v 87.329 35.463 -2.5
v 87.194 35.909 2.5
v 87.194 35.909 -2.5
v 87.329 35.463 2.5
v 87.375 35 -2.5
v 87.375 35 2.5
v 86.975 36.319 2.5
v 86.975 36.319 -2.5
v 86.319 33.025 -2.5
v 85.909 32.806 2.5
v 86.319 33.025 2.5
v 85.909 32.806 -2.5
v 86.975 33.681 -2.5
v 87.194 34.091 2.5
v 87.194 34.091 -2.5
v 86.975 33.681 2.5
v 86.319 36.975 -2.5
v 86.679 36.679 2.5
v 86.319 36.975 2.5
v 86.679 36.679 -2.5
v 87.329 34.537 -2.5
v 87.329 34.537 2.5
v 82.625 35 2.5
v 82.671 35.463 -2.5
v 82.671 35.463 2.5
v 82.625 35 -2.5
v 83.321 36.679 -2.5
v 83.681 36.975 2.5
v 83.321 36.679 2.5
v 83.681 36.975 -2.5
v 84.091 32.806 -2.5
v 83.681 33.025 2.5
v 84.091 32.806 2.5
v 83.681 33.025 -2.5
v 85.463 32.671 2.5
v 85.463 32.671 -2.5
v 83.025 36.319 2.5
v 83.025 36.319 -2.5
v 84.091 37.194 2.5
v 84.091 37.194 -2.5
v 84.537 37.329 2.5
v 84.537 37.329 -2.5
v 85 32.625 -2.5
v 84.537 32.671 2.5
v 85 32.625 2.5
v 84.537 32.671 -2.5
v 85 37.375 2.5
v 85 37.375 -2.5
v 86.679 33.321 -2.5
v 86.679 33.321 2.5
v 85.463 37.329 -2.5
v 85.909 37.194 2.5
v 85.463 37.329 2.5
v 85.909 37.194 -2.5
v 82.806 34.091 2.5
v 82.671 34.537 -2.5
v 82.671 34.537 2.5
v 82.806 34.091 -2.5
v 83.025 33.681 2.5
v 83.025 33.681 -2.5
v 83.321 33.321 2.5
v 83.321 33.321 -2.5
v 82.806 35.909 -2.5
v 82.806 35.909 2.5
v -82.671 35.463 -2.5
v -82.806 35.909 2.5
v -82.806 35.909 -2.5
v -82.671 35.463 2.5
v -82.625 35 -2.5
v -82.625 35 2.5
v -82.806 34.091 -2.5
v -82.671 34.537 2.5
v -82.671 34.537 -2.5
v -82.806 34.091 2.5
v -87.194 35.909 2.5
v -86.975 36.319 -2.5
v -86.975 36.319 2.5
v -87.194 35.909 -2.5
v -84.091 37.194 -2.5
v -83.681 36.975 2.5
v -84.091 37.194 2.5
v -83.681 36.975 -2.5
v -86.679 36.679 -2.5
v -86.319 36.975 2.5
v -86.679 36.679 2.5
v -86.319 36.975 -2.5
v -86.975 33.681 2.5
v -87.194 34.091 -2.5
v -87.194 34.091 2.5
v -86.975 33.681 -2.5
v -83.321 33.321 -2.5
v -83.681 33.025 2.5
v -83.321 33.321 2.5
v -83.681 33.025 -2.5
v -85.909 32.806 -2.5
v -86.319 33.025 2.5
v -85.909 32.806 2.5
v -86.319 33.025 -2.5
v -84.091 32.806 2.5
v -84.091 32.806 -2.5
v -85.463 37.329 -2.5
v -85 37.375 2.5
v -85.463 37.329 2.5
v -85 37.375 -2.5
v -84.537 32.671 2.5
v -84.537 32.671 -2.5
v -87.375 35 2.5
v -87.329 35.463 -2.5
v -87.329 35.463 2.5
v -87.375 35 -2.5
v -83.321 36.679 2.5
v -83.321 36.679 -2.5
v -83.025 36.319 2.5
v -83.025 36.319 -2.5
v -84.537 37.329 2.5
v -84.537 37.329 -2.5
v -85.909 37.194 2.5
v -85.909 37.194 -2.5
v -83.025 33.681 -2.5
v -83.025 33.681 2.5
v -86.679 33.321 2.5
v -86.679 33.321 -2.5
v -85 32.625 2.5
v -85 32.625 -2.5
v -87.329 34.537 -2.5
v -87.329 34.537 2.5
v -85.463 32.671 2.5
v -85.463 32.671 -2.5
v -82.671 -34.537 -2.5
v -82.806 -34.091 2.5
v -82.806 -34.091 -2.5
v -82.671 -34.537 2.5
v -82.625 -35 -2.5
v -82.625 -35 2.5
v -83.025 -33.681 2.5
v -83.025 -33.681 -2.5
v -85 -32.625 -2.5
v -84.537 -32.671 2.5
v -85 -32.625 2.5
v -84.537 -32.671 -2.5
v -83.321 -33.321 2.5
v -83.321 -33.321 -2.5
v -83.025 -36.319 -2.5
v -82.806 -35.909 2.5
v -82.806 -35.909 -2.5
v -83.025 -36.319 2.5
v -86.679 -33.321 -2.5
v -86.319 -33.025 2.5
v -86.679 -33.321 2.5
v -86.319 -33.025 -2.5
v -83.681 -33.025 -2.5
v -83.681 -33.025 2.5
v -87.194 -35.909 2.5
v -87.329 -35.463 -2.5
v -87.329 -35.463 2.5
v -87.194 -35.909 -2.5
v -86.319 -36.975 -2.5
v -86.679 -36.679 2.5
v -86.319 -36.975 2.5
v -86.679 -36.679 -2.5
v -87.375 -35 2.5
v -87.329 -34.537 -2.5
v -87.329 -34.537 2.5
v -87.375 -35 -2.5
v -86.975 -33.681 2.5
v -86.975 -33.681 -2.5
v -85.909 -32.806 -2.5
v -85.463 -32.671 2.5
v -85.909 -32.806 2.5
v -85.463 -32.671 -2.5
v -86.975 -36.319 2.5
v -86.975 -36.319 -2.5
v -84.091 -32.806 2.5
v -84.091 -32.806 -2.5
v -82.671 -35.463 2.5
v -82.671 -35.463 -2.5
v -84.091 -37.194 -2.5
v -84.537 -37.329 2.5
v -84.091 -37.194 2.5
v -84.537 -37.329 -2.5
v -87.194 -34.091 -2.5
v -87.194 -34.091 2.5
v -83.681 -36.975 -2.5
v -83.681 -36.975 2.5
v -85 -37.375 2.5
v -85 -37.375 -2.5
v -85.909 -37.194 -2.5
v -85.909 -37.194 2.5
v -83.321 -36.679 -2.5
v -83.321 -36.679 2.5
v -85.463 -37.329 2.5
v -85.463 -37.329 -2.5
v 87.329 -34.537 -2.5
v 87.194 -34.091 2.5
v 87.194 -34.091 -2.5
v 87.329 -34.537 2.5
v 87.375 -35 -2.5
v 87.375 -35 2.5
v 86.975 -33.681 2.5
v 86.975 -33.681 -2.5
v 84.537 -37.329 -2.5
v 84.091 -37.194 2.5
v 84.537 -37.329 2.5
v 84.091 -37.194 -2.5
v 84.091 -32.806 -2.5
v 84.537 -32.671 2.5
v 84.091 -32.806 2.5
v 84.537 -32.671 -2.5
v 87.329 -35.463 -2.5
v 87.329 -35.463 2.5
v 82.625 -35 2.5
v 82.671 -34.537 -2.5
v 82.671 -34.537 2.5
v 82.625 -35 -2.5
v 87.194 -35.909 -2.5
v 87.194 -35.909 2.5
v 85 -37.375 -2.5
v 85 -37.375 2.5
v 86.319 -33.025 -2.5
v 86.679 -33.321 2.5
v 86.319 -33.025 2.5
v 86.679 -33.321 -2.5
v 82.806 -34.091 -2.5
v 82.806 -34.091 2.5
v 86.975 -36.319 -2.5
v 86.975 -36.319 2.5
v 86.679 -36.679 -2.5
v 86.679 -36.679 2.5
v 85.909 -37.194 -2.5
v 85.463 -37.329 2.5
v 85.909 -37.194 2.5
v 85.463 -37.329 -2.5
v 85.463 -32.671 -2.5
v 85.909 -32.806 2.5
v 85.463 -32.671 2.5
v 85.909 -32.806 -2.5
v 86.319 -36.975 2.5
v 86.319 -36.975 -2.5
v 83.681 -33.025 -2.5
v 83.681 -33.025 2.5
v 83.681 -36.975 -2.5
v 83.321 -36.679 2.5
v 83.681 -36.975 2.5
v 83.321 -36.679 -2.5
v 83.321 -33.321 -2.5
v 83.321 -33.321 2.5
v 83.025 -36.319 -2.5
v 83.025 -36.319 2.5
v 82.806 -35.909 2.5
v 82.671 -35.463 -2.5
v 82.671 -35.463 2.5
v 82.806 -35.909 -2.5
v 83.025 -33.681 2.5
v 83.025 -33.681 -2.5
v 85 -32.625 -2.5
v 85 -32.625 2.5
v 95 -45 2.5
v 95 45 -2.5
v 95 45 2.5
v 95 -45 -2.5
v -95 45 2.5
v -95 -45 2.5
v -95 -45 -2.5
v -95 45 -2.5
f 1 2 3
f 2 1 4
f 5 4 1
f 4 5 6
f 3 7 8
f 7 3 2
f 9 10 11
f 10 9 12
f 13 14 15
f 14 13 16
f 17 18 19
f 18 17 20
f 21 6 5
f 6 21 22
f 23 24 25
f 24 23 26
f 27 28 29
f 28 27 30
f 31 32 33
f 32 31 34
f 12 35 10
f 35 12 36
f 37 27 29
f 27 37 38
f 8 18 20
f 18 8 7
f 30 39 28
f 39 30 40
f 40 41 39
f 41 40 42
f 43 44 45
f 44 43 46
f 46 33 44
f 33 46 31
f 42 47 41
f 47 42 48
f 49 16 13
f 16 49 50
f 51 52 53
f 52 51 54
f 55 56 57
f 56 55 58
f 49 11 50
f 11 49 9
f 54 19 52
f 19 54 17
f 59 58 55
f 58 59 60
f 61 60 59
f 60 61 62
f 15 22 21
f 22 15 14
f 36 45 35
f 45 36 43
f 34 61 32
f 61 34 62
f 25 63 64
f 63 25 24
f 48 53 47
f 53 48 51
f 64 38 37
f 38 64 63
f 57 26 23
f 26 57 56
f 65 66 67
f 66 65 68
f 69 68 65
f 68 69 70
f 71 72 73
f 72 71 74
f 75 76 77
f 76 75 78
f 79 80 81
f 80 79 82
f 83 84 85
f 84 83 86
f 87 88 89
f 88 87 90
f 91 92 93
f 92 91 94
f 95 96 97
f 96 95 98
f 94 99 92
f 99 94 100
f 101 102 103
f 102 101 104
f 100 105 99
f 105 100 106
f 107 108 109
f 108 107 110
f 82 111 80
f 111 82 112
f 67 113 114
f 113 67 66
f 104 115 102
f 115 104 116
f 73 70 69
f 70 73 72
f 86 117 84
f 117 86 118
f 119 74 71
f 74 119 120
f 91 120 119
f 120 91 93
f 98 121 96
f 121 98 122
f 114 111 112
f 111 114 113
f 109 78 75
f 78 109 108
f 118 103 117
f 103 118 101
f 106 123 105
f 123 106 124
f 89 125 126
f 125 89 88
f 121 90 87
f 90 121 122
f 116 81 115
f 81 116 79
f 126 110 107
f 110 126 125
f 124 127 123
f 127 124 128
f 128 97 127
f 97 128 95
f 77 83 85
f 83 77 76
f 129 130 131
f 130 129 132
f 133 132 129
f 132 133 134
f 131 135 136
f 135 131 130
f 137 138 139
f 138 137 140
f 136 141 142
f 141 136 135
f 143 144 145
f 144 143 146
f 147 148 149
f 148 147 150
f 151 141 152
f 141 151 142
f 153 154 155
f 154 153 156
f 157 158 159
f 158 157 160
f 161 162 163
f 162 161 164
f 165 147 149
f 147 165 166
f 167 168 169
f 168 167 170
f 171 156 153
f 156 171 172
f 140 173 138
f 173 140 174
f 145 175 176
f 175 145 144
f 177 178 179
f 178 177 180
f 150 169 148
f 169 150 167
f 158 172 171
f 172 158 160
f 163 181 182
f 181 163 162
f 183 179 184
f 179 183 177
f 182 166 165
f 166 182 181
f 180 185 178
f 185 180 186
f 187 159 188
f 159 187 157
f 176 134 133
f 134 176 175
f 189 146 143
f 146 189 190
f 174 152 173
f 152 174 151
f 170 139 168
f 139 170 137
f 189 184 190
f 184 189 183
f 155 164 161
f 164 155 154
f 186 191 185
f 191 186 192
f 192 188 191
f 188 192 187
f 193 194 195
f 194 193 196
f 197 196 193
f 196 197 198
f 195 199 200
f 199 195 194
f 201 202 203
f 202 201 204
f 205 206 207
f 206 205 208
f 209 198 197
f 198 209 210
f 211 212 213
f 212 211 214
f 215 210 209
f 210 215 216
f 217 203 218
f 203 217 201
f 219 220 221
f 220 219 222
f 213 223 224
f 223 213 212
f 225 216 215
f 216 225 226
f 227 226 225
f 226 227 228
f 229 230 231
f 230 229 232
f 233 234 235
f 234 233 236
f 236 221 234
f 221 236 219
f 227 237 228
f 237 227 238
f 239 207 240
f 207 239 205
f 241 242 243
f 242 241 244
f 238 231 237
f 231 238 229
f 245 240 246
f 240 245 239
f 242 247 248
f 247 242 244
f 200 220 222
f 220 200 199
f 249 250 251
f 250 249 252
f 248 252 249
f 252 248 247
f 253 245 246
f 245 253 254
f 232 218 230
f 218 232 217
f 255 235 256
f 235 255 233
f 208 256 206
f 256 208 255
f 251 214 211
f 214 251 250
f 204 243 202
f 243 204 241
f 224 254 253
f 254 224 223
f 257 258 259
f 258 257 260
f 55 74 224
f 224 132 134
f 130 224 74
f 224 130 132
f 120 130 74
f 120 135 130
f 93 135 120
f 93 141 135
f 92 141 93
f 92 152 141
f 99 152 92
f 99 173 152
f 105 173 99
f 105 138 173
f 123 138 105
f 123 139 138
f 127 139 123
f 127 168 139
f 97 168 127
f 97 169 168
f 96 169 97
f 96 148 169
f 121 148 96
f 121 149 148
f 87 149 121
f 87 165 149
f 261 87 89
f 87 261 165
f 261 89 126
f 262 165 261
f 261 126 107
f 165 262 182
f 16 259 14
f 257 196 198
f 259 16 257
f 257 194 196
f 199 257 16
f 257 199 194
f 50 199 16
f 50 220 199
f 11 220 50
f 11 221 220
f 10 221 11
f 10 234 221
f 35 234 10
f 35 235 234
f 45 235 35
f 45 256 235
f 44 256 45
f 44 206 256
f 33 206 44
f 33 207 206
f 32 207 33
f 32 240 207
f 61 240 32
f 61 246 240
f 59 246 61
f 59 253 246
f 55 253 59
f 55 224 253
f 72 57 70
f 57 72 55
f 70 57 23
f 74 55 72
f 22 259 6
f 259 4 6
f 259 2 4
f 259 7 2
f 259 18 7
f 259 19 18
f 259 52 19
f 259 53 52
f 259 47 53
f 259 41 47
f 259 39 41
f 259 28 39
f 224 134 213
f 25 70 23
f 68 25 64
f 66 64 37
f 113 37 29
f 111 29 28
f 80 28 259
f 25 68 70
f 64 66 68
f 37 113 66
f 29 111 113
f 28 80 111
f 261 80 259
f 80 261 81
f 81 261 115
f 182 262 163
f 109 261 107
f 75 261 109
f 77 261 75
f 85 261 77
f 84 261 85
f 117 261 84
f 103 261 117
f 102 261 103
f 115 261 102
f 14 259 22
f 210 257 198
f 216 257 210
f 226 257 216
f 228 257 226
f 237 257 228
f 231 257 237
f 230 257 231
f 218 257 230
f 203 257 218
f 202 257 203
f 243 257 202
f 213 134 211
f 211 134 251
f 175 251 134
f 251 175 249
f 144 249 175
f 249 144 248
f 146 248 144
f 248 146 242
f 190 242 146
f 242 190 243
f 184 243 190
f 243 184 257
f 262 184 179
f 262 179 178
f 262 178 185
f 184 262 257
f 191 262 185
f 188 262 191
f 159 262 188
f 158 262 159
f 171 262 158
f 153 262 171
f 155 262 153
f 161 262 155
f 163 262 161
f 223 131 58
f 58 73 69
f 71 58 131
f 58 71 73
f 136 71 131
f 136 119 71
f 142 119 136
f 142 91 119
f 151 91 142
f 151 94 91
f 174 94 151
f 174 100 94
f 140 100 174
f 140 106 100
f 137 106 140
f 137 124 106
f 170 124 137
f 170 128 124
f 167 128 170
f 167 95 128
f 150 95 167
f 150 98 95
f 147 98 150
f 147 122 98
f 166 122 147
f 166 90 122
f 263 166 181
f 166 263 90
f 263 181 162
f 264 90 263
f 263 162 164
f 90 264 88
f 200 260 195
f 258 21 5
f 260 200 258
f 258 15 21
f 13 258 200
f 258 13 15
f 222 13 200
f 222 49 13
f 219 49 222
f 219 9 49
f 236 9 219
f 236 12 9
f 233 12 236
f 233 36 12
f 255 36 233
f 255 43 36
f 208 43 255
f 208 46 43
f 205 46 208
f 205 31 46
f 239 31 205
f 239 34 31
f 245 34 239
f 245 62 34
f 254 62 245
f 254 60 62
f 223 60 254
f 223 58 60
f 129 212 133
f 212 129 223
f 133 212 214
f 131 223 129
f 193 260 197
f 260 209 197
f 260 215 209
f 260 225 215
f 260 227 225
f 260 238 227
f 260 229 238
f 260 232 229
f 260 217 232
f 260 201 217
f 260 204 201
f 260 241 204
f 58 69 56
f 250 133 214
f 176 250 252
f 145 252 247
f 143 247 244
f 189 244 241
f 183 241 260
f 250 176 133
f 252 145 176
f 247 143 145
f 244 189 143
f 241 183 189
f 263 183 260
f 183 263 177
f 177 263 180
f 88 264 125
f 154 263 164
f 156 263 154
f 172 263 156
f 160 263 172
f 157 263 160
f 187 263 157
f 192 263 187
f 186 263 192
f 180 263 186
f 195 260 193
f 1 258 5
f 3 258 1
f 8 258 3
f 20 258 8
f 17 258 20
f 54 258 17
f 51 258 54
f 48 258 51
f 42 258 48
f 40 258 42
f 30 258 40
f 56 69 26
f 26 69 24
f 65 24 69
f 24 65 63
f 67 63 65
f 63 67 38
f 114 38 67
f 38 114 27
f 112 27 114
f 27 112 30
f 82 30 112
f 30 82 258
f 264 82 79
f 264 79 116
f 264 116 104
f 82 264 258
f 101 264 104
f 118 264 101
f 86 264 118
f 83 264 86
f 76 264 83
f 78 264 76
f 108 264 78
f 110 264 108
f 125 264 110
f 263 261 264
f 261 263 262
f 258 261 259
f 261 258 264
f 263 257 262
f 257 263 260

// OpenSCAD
$fn = 32;

// ----------------------------------------------------------------------
// Corner plate 190 x 90 x 5
// 4 holes, centres taken from the edge offset
// ----------------------------------------------------------------------

// --- parameters (mm) ---
plate = [190, 90, 5];    // overall size (x, y, z)
holes = 4;               // number of holes the drawing asks for
bore_d = 4.5;            // nominal hole diameter from the drawing
print_allowance = 0.25;  // clearance added for printing
edge = 10;               // hole centre offset from the plate edge

// --- derived feature positions (mm) ---
hole_d = bore_d + print_allowance;  // = 4.75   hole diameter as printed
corner_x = plate[0] / 2 - edge;     // = 85   corner hole X
corner_y = plate[1] / 2 - edge;     // = 35   corner hole Y
feature_centers = [
  [corner_x, corner_y],
  [-corner_x, corner_y],
  [-corner_x, -corner_y],
  [corner_x, -corner_y]
];   // hole centres the loop below drills

// plate outline, every hole drilled through with the same cutters
difference() {
  cube(plate, center = true);
  for (centre = feature_centers)
    translate([centre[0], centre[1], 0])
      cylinder(d = hole_d, h = plate[2] + 2, center = true);
}
